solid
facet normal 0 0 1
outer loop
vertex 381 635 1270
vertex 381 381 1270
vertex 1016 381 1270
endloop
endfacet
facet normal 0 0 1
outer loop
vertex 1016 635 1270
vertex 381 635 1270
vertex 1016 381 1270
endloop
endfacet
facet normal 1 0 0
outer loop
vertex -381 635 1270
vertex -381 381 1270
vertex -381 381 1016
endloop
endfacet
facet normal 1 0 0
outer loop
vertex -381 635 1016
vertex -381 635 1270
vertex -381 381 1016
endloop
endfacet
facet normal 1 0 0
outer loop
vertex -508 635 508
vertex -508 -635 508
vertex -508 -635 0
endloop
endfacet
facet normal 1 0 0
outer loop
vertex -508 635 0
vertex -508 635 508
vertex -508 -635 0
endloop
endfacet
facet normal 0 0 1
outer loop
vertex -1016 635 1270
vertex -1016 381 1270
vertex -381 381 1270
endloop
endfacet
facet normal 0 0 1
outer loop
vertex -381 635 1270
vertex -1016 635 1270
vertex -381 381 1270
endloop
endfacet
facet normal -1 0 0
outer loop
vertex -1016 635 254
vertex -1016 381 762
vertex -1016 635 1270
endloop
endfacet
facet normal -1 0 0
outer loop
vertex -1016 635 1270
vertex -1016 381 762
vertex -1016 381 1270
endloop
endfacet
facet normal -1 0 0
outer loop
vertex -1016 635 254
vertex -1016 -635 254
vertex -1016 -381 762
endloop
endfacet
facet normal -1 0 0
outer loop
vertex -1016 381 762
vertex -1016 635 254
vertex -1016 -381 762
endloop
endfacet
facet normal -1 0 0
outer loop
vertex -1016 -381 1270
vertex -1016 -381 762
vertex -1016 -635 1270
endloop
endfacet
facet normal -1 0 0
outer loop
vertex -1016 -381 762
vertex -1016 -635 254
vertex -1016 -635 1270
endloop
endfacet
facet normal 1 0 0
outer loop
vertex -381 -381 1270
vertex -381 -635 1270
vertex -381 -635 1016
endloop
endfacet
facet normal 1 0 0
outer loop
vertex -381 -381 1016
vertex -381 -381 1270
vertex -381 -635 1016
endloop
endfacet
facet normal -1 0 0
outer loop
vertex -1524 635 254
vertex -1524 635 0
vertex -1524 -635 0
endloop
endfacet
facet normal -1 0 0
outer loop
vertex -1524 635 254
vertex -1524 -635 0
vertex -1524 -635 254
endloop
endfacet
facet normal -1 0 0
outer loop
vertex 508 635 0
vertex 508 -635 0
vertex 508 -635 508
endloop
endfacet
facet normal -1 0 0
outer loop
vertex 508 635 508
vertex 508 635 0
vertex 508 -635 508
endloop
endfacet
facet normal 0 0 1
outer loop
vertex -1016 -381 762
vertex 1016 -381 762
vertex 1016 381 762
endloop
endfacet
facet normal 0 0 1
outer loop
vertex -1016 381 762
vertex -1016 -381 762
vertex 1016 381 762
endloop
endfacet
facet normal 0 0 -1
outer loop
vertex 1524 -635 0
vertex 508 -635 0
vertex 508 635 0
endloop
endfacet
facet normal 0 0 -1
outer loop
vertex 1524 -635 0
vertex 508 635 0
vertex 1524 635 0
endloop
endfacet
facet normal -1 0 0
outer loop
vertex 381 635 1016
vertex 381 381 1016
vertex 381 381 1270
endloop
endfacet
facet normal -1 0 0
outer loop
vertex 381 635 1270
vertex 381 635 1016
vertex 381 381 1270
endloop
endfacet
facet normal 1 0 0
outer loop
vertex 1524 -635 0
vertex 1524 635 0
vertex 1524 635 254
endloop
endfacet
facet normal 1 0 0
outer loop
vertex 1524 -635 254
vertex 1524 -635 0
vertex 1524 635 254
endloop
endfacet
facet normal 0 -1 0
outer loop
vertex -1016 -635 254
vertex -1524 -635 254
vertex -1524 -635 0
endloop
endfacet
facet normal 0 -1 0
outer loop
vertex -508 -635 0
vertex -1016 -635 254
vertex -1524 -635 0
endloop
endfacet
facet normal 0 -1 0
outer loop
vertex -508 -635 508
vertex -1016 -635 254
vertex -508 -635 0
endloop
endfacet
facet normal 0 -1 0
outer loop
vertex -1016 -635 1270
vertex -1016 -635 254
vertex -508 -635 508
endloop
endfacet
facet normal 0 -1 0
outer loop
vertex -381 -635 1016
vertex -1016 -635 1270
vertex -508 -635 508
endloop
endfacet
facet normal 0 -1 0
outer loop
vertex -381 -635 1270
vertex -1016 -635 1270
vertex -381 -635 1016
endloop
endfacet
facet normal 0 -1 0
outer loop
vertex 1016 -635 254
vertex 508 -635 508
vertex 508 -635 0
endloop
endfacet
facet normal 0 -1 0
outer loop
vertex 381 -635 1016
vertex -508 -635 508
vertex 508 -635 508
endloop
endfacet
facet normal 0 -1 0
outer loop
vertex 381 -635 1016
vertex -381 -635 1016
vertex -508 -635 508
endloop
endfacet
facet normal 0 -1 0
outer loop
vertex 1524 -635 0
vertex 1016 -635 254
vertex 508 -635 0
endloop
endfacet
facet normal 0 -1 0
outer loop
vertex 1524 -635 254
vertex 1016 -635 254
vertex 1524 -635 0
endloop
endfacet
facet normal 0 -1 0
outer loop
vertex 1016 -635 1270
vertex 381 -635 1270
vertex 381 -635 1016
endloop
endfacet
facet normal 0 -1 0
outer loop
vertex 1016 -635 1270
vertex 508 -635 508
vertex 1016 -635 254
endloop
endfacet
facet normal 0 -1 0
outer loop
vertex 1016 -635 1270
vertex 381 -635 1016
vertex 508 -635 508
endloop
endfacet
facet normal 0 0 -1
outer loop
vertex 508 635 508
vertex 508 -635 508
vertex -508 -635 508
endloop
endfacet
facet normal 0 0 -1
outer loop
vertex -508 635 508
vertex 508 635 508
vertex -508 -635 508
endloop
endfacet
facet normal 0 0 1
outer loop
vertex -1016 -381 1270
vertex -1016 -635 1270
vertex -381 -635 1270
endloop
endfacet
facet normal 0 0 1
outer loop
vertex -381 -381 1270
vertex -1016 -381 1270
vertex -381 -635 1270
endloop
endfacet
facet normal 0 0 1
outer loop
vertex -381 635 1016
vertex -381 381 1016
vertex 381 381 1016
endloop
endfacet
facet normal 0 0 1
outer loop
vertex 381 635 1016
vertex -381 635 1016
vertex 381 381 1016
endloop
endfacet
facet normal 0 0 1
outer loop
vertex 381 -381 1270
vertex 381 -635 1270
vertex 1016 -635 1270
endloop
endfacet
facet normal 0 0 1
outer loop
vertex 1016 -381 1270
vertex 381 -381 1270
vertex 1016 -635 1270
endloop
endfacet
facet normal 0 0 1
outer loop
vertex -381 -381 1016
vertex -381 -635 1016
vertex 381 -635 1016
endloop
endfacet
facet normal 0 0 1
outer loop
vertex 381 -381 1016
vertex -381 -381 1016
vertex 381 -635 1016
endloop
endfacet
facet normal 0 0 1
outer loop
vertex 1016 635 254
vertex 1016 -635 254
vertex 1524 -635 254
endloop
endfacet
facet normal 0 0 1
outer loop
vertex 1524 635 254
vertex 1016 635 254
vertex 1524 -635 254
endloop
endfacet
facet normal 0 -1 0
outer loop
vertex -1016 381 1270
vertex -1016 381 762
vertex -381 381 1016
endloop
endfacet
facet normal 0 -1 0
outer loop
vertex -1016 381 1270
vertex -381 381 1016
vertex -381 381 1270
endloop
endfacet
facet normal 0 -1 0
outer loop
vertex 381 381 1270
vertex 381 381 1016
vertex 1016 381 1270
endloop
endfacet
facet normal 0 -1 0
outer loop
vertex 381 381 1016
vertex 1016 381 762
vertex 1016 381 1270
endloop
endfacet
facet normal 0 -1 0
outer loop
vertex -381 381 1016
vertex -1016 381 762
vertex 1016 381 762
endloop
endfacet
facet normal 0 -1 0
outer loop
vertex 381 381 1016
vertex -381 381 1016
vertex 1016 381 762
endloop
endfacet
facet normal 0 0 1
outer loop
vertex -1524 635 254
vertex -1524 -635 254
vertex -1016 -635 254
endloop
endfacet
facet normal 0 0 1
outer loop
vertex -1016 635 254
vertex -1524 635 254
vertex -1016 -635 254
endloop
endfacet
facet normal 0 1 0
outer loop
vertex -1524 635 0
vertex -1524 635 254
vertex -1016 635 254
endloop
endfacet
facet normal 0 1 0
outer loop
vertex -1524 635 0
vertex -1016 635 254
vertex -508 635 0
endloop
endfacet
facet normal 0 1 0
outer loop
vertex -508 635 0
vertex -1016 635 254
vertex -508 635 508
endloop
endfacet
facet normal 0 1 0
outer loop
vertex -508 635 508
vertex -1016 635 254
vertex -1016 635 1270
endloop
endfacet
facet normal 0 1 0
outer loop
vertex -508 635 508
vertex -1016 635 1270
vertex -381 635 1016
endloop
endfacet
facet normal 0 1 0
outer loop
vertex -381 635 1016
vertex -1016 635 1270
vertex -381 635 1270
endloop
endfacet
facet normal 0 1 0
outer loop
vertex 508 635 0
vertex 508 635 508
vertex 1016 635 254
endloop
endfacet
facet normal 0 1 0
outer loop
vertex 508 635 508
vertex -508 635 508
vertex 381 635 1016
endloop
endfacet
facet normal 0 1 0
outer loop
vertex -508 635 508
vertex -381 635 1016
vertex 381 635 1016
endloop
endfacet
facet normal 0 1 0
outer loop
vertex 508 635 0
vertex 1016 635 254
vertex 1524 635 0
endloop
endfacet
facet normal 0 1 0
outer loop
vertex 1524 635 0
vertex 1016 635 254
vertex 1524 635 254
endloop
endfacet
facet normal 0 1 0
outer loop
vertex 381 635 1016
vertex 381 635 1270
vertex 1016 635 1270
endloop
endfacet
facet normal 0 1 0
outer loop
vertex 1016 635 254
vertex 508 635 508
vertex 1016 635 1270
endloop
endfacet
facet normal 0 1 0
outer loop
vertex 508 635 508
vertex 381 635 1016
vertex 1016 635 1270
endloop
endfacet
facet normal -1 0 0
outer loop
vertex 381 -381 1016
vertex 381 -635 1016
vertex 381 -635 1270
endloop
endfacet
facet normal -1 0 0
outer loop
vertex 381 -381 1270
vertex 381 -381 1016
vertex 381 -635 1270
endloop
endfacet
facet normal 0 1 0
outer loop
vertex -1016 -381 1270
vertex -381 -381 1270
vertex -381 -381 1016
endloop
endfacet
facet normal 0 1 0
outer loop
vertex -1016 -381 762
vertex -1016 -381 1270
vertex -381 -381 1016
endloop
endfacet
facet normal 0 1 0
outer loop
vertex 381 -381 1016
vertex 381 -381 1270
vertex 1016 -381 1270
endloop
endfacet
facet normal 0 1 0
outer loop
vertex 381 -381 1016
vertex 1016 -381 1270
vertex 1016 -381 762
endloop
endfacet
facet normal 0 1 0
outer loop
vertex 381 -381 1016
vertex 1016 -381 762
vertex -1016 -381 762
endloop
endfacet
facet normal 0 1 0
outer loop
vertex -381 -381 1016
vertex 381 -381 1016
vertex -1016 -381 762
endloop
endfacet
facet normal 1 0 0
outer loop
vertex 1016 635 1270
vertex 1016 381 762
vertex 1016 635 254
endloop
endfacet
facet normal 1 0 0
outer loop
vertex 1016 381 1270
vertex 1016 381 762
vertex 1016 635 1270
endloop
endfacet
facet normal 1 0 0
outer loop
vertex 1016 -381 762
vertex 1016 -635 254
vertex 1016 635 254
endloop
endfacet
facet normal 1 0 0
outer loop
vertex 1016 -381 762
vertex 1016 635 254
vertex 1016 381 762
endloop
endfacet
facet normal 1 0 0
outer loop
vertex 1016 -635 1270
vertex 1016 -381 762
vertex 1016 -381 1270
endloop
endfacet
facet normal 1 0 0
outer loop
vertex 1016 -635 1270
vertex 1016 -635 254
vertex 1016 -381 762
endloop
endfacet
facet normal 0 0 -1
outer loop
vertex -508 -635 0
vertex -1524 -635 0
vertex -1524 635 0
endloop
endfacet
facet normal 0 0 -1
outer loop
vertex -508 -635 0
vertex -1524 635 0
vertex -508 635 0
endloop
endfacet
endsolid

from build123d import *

# Parameters (mm, degrees)
F0_W     = 3048
F0_H     = 1270
F1_DEPTH = 635
F2_W     = 508
F2_H     = 1016
F3_DEPTH = 1270.001
F5_DEPTH = 2540.001


with BuildPart() as f1:
    # F0 (on Front) → F1 (new body, symmetric)
    with BuildSketch(Plane.XZ):
        with Locations((0, 635)):
            Rectangle(F0_W, F0_H)
    extrude(amount=F1_DEPTH, both=True)

    # F2 (on face) → F3 (cut, through all)
    with BuildSketch(Plane.XZ.offset(635)):
        with Locations((1270, 762)):
            Rectangle(F2_W, F2_H)
        Polygon((-508, 0), (0, 0), (508, 0), (508, 508), (0, 508), (-508, 508), align=None)
        Polygon((381, 1270), (0, 1270), (-381, 1270), (-381, 1016), (0, 1016), (381, 1016), align=None)
        with Locations((-1270, 762)):
            Rectangle(F2_W, F2_H)
    extrude(amount=-F3_DEPTH, mode=Mode.SUBTRACT)

    # F4 (on face) → F5 (cut, through all)
    with BuildSketch(Plane.YZ.offset(1016)):
        Polygon((381, 1270), (0, 1270), (-381, 1270), (-381, 762), (0, 762), (381, 762), align=None)
    extrude(amount=-F5_DEPTH, mode=Mode.SUBTRACT)


solid = f1.part
